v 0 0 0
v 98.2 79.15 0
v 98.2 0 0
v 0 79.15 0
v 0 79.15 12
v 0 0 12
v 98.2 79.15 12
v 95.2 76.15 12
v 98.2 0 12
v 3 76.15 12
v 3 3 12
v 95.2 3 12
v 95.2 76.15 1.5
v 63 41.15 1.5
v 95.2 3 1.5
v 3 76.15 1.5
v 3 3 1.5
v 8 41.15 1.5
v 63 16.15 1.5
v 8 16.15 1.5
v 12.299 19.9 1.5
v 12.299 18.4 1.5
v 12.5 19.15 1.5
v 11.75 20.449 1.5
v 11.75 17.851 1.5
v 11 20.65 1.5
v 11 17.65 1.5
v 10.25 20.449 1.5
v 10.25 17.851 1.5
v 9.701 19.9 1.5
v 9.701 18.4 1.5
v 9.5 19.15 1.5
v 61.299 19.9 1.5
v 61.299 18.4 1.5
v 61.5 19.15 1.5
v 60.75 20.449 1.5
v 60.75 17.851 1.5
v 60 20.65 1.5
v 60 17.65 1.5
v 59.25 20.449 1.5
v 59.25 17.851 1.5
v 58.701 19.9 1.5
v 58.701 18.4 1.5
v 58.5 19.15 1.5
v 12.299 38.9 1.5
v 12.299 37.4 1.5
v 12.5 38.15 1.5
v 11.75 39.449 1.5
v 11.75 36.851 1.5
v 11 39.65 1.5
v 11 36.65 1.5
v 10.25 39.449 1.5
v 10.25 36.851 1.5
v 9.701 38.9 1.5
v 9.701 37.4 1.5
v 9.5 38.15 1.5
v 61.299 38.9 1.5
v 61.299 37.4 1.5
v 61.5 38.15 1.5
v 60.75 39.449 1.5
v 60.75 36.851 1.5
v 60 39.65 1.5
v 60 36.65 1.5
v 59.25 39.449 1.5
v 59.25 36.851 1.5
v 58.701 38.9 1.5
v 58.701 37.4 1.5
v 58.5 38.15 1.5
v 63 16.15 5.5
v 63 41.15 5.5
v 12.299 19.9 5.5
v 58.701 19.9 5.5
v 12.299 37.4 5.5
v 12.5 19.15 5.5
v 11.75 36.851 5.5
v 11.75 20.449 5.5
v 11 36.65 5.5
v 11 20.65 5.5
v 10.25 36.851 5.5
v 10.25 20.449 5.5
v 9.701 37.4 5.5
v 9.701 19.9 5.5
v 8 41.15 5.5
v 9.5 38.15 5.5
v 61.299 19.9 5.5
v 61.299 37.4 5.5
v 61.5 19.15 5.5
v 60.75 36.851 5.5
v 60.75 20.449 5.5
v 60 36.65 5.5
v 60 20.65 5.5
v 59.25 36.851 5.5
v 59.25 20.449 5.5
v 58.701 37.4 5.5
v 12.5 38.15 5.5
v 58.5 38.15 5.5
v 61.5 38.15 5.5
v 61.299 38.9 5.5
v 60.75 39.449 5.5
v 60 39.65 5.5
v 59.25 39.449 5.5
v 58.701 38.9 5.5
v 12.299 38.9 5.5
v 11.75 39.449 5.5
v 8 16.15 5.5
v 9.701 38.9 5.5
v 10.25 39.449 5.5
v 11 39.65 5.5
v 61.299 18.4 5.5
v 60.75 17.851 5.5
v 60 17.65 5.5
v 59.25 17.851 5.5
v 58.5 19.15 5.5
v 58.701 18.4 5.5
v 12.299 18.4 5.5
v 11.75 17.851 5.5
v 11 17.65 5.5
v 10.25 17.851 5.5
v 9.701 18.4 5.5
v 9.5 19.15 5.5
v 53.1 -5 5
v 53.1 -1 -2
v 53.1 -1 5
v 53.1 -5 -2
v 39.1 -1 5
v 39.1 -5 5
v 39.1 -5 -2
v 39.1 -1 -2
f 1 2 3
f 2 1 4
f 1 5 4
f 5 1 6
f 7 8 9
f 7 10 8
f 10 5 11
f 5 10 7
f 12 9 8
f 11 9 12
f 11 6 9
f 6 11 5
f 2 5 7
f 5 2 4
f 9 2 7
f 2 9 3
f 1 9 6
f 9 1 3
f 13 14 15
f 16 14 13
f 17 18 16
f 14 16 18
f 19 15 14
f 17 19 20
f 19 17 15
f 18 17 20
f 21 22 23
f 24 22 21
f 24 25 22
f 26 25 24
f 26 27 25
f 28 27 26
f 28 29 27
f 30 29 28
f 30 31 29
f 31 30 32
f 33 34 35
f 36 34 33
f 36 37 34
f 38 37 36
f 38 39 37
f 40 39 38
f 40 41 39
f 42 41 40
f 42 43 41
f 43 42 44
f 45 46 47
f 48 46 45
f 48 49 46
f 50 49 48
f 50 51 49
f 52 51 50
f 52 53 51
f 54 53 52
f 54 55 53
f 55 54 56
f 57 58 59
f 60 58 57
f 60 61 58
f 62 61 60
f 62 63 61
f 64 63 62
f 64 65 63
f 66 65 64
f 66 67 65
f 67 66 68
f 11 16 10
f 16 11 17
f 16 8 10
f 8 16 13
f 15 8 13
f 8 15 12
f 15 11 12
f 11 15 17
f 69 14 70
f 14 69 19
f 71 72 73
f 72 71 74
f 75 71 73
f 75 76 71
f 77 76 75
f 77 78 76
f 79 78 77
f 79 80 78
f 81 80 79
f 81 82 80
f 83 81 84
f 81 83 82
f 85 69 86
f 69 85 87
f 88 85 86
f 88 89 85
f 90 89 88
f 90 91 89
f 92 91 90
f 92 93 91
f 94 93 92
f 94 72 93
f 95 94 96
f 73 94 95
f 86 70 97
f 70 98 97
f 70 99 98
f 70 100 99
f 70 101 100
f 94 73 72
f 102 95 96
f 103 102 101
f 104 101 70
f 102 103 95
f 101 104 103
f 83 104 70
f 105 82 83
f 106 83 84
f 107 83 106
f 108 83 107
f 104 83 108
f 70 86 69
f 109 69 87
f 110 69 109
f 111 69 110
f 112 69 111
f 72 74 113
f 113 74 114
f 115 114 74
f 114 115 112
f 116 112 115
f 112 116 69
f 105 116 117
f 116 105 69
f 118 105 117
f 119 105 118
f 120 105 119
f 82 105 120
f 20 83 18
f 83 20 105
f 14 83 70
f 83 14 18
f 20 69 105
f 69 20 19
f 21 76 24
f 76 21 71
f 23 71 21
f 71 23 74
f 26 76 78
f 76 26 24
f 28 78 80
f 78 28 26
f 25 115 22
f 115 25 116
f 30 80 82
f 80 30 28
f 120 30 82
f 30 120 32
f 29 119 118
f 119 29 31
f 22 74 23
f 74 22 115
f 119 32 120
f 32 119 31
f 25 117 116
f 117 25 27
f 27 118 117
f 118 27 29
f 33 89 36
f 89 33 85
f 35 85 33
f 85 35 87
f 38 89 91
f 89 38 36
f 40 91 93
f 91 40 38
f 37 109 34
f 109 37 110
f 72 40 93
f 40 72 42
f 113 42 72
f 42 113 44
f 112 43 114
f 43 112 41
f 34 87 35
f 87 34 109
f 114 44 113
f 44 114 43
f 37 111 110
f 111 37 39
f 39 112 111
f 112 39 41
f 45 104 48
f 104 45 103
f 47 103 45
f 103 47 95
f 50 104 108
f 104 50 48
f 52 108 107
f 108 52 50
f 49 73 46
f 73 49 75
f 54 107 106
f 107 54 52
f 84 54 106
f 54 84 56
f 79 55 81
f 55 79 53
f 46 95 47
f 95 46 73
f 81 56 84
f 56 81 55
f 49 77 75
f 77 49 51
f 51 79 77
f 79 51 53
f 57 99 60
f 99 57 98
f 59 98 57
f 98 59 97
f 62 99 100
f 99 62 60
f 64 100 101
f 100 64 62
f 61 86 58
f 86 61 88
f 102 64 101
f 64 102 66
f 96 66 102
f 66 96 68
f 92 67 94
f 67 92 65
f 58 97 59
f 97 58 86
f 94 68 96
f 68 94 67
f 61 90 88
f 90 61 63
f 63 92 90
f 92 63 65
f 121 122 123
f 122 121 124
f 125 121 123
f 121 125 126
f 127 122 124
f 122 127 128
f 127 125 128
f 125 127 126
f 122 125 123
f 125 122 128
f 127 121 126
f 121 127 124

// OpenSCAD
/* AgentHub Macropad 3D Case */
/* Requires: 12x MX switches, 1x Pi Pico */

// --- Dimensions ---
KEY_W = 19.05;   // MX switch spacing
KEY_H = 19.05;
COLS = 4;
ROWS = 3;
PAD = 8;         // wall padding
WALL = 3;        // wall thickness
CASE_W = COLS * KEY_W + PAD * 2;
CASE_H = ROWS * KEY_H + PAD * 2;
CASE_Z = 12;     // case height
PLATE_Z = 1.5;   // switch plate thickness

// --- Plate ---
module plate() {
    difference() {
        square([CASE_W, CASE_H]);
        for (r = [0:ROWS-1], c = [0:COLS-1]) {
            x = PAD + c * KEY_W + KEY_W/2;
            y = PAD + r * KEY_H + KEY_H/2;
            translate([x, y])
                square([14, 14], center=true); // MX cutout
        }
    }
}

// --- Case bottom ---
module case_bottom() {
    difference() {
        linear_extrude(CASE_Z)
            square([CASE_W + WALL*2, CASE_H + WALL*2]);
        translate([WALL, WALL, PLATE_Z])
            linear_extrude(CASE_Z)
                square([CASE_W, CASE_H]);
    }
}

// --- Pico mount ---
module pico_mount() {
    translate([WALL + 5, WALL + CASE_H - 60, PLATE_Z]) {
        difference() {
            cube([55, 25, 4]);
            // mounting holes
            translate([3, 3, -1]) cylinder(r=1.5, h=6, $fn=12);
            translate([52, 3, -1]) cylinder(r=1.5, h=6, $fn=12);
            translate([3, 22, -1]) cylinder(r=1.5, h=6, $fn=12);
            translate([52, 22, -1]) cylinder(r=1.5, h=6, $fn=12);
        }
    }
}

// --- USB cutout ---
module usb_cutout() {
    translate([WALL + (CASE_W - 12)/2, -1, PLATE_Z + 2])
        cube([12, WALL + 2, 8]);
}

// --- Assembly ---
module assembly() {
    // Case bottom
    case_bottom();
    // USB cutout
    translate([CASE_W/2, -WALL, PLATE_Z])
        cube([14, WALL+1, 7], center=true);
    // Pico mount
    pico_mount();
}

assembly();
